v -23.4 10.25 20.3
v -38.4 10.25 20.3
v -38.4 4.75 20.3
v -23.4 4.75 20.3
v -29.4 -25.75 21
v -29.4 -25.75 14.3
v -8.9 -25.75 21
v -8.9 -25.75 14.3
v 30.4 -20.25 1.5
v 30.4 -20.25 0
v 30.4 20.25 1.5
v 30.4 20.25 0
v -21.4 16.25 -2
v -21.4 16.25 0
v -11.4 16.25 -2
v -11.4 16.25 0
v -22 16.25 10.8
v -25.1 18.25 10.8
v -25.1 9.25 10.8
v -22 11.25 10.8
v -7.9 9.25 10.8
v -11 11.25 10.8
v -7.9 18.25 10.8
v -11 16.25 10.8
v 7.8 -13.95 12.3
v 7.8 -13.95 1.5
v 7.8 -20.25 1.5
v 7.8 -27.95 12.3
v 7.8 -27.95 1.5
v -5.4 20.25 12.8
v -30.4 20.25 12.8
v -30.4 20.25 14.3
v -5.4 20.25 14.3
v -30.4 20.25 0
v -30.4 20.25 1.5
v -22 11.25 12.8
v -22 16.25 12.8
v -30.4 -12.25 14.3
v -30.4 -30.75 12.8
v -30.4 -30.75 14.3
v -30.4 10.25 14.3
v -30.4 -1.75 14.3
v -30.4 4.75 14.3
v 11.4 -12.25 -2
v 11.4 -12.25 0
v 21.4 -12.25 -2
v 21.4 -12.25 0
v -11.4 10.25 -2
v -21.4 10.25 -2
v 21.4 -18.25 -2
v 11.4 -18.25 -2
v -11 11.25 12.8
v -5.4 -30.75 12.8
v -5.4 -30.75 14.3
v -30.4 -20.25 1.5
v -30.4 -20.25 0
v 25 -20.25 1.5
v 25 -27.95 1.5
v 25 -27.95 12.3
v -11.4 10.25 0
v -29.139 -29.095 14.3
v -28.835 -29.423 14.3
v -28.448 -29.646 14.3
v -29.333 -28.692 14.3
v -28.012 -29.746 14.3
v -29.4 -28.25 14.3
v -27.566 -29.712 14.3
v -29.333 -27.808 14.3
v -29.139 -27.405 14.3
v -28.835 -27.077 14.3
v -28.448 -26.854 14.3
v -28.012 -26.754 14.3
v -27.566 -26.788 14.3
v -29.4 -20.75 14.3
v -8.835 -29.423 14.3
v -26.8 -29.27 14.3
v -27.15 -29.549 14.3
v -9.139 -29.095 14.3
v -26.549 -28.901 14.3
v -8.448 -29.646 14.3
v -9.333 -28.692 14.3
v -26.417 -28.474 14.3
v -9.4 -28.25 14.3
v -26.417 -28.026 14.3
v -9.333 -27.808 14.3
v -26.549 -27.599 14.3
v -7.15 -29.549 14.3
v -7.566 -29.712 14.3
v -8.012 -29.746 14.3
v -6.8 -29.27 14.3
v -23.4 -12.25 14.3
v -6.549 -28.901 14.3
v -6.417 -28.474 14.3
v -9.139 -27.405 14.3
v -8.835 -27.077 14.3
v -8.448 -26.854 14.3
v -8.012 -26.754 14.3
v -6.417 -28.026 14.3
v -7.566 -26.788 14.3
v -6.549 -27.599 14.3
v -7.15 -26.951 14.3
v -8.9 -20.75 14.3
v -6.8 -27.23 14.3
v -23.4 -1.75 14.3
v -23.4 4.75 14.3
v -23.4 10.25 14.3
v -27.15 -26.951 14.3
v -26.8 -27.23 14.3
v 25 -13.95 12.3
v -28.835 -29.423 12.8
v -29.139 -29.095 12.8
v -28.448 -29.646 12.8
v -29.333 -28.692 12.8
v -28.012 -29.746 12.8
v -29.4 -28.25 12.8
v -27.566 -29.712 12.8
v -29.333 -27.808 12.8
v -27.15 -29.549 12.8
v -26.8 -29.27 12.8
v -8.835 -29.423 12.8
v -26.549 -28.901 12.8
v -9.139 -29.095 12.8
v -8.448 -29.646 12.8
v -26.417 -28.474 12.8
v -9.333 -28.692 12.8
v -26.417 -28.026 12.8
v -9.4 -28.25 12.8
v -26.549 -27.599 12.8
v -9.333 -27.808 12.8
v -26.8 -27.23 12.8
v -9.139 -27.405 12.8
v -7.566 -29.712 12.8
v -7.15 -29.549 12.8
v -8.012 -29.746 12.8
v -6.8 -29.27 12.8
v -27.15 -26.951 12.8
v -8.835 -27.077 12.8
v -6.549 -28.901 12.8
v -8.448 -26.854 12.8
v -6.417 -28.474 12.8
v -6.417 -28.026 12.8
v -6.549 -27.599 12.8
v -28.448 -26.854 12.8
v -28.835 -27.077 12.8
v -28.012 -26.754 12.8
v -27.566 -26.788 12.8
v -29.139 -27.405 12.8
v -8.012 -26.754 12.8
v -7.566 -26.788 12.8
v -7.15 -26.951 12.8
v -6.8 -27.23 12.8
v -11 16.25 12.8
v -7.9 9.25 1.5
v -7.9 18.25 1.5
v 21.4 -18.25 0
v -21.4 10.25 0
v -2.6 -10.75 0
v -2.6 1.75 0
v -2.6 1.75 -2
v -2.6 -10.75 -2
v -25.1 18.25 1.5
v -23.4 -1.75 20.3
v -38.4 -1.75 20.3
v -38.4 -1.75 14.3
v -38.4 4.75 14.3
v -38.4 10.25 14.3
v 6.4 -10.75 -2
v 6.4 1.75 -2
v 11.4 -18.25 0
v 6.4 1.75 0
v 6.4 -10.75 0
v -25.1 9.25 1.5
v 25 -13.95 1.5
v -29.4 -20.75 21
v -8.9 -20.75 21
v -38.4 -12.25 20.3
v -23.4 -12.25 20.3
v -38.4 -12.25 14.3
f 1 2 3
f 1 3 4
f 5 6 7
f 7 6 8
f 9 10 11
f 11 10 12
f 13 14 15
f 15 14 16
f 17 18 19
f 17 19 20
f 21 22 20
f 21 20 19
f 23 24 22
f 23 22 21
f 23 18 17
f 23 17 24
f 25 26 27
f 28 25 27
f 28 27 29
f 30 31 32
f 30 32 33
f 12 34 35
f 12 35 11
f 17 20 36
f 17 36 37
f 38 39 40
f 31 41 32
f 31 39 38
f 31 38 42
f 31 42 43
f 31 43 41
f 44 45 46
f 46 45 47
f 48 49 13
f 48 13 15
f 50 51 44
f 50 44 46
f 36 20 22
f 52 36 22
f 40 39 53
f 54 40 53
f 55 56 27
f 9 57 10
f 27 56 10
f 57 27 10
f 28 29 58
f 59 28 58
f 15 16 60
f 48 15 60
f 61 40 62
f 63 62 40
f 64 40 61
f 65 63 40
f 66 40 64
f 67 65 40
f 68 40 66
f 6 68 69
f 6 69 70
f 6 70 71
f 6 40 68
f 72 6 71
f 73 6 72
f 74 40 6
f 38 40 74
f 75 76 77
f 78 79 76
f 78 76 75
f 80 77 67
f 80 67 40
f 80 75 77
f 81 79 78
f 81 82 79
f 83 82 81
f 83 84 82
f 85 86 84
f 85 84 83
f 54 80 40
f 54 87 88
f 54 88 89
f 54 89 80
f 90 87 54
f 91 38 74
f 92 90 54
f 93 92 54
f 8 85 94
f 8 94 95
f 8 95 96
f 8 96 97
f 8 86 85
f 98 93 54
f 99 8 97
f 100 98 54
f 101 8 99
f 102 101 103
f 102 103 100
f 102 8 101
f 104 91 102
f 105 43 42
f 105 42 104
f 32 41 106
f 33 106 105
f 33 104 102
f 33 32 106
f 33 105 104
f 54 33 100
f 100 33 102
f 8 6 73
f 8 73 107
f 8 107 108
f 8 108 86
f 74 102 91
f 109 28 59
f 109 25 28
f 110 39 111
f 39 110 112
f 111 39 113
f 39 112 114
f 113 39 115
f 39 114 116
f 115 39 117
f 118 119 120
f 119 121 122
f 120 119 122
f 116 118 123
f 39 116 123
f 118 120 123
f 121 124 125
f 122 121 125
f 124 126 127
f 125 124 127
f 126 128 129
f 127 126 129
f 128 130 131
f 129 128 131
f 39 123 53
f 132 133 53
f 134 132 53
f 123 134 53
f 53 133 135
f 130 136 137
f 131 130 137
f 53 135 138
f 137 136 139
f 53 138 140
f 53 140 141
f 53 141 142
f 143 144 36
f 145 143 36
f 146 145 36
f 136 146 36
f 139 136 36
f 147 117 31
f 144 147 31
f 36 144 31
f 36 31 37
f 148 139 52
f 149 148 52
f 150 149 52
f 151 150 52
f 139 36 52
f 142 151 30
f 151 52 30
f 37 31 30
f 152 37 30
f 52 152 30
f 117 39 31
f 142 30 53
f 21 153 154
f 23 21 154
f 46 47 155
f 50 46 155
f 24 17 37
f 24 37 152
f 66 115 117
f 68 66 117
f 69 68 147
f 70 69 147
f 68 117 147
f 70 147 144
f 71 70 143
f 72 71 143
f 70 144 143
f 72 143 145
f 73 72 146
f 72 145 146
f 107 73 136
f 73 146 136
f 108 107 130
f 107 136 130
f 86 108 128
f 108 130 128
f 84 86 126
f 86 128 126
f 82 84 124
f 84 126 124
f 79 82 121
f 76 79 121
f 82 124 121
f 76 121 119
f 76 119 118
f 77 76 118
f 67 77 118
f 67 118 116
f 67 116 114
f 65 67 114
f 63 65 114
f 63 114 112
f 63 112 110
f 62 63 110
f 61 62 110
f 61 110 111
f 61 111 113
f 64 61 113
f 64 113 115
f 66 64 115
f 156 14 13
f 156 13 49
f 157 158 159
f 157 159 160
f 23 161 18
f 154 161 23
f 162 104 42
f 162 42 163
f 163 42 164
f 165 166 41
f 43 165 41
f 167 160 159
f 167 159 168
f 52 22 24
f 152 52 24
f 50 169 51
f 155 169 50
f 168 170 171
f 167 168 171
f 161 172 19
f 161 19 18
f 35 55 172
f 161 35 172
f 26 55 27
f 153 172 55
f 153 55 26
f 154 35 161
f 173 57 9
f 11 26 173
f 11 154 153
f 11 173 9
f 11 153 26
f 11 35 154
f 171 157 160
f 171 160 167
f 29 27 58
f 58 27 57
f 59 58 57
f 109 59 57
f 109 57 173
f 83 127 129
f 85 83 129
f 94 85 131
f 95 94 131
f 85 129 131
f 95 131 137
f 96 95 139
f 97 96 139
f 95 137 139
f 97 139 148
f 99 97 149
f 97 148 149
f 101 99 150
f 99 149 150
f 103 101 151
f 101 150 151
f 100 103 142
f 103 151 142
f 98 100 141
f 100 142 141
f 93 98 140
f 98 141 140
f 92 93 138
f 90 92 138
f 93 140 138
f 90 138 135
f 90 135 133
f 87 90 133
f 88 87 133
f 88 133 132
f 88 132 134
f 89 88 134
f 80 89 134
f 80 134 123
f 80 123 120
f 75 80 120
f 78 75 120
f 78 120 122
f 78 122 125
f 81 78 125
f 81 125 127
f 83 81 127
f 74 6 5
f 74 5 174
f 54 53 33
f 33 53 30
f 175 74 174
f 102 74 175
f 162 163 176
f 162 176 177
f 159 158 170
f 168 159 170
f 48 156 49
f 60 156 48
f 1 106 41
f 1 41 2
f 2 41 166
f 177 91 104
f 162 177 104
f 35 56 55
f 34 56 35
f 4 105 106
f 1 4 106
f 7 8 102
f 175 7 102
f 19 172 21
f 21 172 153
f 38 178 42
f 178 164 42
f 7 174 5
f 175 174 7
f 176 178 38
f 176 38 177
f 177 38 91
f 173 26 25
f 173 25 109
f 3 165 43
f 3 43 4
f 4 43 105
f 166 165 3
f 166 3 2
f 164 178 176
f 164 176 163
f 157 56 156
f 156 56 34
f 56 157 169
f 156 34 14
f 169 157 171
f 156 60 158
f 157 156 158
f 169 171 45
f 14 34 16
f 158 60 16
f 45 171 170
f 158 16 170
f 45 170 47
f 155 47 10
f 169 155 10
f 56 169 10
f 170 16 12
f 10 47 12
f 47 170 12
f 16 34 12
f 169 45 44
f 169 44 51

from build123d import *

# Parameters (mm, degrees)
F0_W      = 60.8
F0_H      = 40.5
F1_DEPTH  = 1.5
F2_W      = 17.2
F2_H      = 7.7
F2_H_2    = 6.3
F3_DEPTH  = 10.8
F4_W      = 17.2
F4_H      = 9
F5_DEPTH  = 9.3
F6_W      = 10
F6_H      = 6
F6_W_2    = 9
F6_H_2    = 12.5
F7_DEPTH  = 2
F8_W      = 11
F8_H      = 5
F9_DEPTH  = 2
F10_W     = 25
F10_H     = 51
F10_W_2   = 11
F10_H_2   = 5
F11_DEPTH = 1.5
F12_W     = 8
F12_H     = 5.5
F12_W_2   = 7
F12_H_2   = 10.5
F13_DEPTH = 6
F14_W     = 20.5
F14_H     = 5
F15_DEPTH = 6.7
F17_D     = 3


with BuildPart() as f1:
    # F0 (on Top) → F1 (new body)
    with BuildSketch(Plane.XY):
        Rectangle(F0_W, F0_H)
    extrude(amount=F1_DEPTH)

    # F2 (on face) → F3 (join)
    with BuildSketch(Plane.XY.offset(1.5)):
        with Locations((16.4, -24.1)):
            Rectangle(F2_W, F2_H)
        with Locations((16.4, -17.1)):
            Rectangle(F2_W, F2_H_2)
    extrude(amount=F3_DEPTH)

    # F4 (on face) → F5 (join)
    with BuildSketch(Plane.XY.offset(1.5)):
        with Locations((-16.5, 13.75)):
            Rectangle(F4_W, F4_H)
    extrude(amount=F5_DEPTH)

    # F6 (on face) → F7 (join)
    with BuildSketch(Plane(origin=(0, 0, 0), x_dir=(1, 0, 0), z_dir=(0, 0, -1))):
        with Locations((-16.4, -13.25)):
            Rectangle(F6_W, F6_H)
        with Locations((1.9, 4.5)):
            Rectangle(F6_W_2, F6_H_2)
        with Locations((16.4, 15.25)):
            Rectangle(F6_W, F6_H)
    extrude(amount=F7_DEPTH)

    # F8 (on face) → F9 (join)
    with BuildSketch(Plane.XY.offset(10.8)):
        with Locations((-16.5, 13.75)):
            Rectangle(F8_W, F8_H)
    extrude(amount=F9_DEPTH)

    # F10 (on face) → F11 (join)
    with BuildSketch(Plane.XY.offset(12.8)):
        with Locations((-17.9, -5.25)):
            Rectangle(F10_W, F10_H)
        with Locations((-16.5, 13.75)):
            Rectangle(F10_W_2, F10_H_2, mode=Mode.SUBTRACT)
        with Locations((-16.5, 13.75)):
            Rectangle(F10_W_2, F10_H_2)
    extrude(amount=F11_DEPTH)

    # F12 (on face) → F13 (join)
    with BuildSketch(Plane.XY.offset(14.3)):
        with Locations((-34.4, 7.5)):
            Rectangle(F12_W, F12_H)
        with Locations((-26.9, 7.5)):
            Rectangle(F12_W_2, F12_H)
        with Locations((-26.9, -7)):
            Rectangle(F12_W_2, F12_H_2)
        with Locations((-34.4, -7)):
            Rectangle(F12_W, F12_H_2)
    extrude(amount=F13_DEPTH)

    # F14 (on face) → F15 (join)
    with BuildSketch(Plane.XY.offset(14.3)):
        with Locations((-19.15, -23.25)):
            Rectangle(F14_W, F14_H)
    extrude(amount=F15_DEPTH)

    # F17 (through all)
    with Locations(Plane.XY.offset(14.3)):
        with Locations((-7.9, -28.25), (-27.9, -28.25)):
            Hole(F17_D / 2)


solid = f1.part
